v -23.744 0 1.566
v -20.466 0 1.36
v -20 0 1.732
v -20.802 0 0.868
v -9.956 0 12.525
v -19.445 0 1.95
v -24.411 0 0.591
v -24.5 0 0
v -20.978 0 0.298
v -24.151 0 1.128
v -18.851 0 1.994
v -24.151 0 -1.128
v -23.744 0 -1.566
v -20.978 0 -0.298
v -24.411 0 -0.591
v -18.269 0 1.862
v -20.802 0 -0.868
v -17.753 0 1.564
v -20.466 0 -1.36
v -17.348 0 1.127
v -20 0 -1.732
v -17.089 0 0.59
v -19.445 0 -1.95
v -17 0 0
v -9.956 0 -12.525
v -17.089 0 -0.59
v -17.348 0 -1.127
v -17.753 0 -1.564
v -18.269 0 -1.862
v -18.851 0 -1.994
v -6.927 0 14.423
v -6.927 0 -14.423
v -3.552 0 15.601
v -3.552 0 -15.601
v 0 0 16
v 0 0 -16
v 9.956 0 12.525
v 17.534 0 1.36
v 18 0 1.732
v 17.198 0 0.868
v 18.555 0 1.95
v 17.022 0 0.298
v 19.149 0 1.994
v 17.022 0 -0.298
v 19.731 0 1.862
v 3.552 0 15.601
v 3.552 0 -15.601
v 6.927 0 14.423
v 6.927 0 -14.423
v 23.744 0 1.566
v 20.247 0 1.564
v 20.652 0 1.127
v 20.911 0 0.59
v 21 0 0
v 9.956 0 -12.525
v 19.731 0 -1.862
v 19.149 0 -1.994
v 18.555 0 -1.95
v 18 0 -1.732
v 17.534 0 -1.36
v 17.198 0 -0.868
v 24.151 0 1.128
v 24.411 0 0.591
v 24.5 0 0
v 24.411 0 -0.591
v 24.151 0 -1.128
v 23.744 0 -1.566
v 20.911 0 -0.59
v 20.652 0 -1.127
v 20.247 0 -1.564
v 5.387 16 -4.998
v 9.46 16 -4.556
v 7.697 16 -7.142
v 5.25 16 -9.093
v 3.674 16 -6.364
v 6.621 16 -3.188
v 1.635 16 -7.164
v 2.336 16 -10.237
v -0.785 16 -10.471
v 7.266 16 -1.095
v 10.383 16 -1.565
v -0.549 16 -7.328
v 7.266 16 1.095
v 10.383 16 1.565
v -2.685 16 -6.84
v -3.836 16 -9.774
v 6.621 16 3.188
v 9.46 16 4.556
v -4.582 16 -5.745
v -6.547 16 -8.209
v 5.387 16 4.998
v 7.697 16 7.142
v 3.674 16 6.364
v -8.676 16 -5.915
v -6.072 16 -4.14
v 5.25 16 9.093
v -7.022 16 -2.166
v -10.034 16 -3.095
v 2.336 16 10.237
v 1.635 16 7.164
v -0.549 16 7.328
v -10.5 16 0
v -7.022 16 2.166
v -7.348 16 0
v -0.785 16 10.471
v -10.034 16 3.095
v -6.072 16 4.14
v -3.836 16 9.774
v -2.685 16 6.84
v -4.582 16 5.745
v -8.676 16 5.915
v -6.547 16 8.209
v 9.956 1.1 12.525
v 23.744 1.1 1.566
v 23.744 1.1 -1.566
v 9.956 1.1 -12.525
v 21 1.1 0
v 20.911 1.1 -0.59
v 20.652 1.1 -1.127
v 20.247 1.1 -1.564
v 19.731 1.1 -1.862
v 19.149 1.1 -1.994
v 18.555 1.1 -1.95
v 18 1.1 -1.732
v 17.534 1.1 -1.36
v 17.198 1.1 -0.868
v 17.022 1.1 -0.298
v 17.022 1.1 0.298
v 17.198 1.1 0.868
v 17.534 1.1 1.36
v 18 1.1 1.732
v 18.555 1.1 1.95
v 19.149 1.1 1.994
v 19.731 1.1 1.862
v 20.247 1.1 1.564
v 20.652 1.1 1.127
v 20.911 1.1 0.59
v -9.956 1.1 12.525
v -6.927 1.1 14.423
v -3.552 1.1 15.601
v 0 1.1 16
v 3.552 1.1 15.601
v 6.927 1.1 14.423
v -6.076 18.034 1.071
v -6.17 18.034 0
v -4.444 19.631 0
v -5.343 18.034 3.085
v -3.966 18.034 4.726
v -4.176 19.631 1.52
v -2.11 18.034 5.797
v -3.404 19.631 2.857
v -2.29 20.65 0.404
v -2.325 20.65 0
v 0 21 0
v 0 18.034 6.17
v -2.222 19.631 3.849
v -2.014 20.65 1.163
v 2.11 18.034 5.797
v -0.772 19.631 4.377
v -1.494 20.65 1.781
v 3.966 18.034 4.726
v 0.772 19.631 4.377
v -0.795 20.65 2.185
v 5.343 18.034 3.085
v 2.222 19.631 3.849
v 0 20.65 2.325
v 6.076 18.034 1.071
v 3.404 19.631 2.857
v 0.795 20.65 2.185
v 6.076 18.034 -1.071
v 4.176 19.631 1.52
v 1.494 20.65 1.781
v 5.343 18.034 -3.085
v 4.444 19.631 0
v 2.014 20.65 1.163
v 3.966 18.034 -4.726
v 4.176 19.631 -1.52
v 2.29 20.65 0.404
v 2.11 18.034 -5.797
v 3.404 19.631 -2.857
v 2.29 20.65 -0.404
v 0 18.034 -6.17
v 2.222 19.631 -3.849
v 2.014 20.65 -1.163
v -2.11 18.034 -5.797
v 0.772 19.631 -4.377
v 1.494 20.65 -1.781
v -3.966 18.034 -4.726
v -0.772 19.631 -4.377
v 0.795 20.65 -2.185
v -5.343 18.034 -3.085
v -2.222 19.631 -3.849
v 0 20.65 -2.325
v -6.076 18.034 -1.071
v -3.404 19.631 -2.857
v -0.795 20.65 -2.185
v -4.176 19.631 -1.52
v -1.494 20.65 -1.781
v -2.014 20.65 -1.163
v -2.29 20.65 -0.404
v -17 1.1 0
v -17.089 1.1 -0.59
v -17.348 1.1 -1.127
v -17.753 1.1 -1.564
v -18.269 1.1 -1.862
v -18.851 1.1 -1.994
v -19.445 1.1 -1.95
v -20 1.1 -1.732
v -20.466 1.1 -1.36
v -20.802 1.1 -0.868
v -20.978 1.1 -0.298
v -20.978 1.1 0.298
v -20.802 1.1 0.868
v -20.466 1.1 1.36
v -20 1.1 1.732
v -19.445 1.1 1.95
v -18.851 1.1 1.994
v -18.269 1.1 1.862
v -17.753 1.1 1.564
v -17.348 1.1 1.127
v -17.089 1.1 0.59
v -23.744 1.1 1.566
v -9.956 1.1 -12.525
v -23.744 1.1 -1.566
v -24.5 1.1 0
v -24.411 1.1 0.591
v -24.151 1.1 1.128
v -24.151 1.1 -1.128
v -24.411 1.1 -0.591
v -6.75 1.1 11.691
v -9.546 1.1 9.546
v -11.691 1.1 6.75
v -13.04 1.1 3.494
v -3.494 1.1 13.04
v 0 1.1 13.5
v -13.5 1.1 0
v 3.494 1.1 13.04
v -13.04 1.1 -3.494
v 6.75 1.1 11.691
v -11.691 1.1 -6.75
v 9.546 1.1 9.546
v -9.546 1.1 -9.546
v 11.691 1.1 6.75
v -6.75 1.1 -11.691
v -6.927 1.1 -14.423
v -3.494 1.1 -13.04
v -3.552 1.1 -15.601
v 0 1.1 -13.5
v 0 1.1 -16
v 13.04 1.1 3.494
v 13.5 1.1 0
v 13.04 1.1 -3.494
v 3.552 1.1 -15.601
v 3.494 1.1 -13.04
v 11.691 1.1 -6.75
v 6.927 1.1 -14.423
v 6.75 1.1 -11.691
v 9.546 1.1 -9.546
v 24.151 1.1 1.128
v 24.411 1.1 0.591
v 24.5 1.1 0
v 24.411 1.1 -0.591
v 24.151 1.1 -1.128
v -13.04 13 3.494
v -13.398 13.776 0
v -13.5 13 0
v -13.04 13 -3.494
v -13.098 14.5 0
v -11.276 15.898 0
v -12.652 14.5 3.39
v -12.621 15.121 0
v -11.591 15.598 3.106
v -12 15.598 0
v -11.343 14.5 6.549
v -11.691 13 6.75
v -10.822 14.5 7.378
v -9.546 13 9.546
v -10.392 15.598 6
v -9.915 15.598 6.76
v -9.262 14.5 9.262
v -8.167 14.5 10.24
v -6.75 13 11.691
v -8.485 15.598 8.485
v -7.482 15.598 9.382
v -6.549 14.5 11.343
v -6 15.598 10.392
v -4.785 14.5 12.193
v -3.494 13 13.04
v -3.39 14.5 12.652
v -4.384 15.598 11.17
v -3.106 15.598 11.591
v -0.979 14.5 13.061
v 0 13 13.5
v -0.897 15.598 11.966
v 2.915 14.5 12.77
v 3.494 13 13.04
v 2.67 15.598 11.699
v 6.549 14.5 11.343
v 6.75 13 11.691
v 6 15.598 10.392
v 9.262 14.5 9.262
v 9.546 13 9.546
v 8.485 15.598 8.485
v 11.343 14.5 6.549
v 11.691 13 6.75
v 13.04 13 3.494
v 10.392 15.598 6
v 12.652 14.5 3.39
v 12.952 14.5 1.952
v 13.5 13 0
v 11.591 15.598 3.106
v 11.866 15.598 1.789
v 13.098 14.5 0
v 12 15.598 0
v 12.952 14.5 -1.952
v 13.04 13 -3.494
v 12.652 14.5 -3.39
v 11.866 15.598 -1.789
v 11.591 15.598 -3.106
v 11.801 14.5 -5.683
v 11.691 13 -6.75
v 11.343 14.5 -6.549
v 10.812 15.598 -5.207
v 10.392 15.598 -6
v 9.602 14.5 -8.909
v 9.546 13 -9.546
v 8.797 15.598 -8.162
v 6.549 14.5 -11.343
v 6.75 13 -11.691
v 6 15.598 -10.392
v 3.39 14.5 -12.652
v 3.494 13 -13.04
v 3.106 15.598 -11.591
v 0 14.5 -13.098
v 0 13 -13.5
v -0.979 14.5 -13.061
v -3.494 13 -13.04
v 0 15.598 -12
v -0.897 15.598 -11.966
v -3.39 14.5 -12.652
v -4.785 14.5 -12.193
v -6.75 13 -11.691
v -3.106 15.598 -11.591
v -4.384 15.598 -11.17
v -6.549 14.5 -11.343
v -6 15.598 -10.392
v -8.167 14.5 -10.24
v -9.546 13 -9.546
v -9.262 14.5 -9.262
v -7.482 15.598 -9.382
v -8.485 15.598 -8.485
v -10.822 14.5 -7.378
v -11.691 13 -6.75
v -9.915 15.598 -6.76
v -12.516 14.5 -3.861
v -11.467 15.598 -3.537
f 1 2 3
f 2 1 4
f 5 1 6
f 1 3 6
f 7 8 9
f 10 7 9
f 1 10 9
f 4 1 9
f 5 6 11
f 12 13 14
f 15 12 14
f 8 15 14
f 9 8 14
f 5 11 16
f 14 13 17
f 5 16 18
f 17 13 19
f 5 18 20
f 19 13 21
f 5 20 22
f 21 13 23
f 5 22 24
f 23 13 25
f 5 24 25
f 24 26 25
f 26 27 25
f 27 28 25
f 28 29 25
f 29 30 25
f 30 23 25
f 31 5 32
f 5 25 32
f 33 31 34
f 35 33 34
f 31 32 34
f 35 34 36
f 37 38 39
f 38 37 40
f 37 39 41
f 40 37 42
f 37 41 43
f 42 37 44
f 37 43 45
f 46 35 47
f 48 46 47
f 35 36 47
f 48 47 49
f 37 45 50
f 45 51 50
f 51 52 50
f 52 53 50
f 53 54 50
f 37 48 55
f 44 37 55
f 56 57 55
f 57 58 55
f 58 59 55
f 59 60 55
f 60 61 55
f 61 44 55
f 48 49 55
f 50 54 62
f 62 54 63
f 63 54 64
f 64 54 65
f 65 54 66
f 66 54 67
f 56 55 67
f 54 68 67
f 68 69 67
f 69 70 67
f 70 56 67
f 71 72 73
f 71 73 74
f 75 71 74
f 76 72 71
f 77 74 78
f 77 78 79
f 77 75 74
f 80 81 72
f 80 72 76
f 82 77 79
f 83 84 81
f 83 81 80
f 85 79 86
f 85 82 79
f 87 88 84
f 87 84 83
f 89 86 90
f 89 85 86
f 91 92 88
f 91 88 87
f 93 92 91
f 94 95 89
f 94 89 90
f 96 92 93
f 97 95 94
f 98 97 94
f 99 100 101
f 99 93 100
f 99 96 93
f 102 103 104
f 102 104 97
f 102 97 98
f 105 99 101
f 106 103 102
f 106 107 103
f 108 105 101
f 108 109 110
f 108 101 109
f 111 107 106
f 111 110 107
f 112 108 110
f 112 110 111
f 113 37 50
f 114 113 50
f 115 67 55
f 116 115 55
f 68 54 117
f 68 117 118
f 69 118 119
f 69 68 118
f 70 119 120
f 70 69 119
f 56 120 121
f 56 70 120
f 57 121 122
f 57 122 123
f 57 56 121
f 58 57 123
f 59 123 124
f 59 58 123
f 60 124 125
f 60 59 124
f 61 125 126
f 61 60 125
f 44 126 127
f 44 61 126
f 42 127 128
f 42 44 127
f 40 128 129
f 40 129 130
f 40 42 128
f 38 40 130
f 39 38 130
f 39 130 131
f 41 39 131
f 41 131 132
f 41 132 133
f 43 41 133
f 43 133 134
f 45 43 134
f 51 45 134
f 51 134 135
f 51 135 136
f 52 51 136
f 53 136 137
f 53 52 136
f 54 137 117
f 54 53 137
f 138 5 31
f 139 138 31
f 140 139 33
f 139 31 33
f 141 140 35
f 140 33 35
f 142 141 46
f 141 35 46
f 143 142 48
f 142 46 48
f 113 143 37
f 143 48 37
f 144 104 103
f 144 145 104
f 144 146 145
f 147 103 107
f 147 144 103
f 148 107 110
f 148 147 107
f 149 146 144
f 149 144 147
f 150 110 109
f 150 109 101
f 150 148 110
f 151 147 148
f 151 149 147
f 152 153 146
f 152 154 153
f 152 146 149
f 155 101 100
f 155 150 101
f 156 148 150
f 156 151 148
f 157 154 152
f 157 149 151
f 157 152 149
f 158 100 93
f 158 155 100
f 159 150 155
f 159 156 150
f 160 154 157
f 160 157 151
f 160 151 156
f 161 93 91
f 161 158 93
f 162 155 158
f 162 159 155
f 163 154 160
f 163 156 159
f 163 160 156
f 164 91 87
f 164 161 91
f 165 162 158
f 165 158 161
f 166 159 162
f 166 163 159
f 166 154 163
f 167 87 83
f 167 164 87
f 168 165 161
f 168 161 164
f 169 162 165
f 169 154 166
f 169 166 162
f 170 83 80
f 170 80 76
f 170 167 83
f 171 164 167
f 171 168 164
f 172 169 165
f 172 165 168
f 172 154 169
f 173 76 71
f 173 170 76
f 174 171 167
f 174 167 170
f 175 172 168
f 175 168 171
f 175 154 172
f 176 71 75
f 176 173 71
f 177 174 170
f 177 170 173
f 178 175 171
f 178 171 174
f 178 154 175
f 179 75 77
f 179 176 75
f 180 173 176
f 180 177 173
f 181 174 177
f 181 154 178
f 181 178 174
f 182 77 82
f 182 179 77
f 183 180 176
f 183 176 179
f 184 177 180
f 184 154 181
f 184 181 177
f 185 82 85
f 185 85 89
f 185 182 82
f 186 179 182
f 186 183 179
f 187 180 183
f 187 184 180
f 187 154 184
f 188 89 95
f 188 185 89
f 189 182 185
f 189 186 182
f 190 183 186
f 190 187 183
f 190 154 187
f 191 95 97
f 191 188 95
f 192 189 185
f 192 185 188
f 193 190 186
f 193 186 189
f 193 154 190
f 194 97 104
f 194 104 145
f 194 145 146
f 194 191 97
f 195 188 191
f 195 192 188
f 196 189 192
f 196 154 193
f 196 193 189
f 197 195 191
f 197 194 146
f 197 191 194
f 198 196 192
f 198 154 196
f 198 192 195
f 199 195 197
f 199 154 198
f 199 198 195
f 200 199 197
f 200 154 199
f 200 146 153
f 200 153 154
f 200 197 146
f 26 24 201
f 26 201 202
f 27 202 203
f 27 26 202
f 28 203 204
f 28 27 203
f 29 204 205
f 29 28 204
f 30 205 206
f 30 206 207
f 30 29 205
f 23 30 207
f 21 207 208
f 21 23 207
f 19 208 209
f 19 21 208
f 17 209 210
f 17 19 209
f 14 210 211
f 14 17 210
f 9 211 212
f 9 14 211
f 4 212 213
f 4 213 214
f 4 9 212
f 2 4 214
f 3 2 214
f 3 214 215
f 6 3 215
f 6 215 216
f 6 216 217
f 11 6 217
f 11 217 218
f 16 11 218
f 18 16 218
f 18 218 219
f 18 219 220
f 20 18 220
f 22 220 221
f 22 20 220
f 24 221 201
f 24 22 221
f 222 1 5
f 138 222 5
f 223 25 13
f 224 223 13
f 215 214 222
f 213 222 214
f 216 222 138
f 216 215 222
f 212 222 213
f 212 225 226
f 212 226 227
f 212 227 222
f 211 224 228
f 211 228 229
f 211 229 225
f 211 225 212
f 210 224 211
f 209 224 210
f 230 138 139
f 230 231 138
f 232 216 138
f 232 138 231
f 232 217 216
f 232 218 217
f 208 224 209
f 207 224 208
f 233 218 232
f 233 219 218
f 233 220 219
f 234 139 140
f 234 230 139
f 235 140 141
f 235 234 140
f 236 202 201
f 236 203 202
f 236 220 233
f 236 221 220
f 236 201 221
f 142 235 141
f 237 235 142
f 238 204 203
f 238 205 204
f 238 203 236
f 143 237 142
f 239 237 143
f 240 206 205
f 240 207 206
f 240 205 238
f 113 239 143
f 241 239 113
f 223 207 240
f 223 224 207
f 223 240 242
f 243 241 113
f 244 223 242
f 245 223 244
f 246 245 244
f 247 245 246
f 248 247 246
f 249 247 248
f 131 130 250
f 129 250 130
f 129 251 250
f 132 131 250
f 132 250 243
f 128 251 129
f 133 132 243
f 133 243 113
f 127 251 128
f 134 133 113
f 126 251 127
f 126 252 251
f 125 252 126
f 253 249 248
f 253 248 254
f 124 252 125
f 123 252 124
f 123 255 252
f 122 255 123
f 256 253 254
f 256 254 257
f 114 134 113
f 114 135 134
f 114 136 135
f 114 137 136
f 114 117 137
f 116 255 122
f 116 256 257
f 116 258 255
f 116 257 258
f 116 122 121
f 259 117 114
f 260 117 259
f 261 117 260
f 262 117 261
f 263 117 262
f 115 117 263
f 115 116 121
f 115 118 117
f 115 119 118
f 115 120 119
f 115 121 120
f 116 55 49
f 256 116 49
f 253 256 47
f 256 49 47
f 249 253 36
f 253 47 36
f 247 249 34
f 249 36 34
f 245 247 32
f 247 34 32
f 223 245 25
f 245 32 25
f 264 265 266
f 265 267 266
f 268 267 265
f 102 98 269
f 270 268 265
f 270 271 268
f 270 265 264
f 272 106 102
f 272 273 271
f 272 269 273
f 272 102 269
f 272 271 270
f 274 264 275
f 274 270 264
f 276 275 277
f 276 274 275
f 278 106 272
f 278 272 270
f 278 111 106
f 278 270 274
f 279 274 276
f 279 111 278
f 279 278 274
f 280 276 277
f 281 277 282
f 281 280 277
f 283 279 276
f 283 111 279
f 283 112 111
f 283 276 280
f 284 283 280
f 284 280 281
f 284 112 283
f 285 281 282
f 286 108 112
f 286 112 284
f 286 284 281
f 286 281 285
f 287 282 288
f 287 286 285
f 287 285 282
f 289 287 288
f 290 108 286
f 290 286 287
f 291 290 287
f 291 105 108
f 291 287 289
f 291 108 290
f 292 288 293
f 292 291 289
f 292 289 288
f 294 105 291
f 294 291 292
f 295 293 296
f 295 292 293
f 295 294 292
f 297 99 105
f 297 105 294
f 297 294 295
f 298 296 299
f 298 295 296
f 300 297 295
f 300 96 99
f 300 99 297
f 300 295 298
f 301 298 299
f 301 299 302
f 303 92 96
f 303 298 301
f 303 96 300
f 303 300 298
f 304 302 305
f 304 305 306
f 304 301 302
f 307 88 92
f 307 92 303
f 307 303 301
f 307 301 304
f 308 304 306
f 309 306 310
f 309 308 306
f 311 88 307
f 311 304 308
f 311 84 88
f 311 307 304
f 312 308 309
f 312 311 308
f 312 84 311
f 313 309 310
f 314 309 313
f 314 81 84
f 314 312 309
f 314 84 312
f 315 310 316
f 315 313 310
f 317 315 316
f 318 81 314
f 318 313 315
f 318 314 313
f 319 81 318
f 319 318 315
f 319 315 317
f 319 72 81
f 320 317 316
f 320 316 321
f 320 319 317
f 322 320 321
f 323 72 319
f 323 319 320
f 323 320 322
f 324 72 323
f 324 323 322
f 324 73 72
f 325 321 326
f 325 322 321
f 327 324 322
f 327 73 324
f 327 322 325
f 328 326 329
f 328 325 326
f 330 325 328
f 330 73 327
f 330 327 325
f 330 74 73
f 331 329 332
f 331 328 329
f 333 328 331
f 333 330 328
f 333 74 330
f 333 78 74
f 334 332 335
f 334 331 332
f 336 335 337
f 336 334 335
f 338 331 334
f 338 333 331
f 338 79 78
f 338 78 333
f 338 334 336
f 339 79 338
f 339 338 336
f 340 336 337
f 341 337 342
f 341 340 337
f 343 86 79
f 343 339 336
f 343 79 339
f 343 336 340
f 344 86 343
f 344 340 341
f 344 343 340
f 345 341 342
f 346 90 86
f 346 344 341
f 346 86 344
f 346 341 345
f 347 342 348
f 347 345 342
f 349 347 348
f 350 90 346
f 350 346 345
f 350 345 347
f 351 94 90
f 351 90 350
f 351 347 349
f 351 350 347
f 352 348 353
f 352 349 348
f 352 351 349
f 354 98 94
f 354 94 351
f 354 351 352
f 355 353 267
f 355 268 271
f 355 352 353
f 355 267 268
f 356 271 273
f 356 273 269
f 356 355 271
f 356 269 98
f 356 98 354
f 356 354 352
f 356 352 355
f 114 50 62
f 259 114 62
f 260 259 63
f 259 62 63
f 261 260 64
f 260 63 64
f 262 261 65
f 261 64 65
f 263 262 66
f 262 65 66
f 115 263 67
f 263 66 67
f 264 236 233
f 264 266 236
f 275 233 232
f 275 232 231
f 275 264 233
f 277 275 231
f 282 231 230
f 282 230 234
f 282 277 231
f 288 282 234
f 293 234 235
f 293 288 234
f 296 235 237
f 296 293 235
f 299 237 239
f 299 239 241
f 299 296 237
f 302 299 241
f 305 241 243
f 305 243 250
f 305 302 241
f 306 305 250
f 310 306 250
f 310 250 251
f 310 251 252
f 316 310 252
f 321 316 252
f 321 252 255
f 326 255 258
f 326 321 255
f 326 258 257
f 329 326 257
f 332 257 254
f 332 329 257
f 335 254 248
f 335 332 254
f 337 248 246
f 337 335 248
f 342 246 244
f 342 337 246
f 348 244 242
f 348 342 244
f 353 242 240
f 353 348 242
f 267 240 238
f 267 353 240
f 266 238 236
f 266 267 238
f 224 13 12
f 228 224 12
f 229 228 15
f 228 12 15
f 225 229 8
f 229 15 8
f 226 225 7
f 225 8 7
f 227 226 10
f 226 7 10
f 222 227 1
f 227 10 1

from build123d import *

# Parameters (mm, degrees)
SKETCH_1_R      = 2
EXTRUDE_1_DEPTH = 1.1


with BuildPart() as part:
    # 草图1 → 凸台-拉伸1 (new body)
    with BuildSketch(Plane(origin=(0, 0, 0), x_dir=(1, 0, 0), z_dir=(0, 1, 0))):
        with BuildLine():
            Line((-9.955555556, 12.525450634), (-23.744444444, 1.565681329))
            ThreePointArc((-23.744444444, 1.565681329), (-24.5, 0), (-23.744444444, -1.565681329))
            Line((-23.744444444, -1.565681329), (-9.955555556, -12.525450634))
            ThreePointArc((-9.955555556, -12.525450634), (0, -16), (9.955555556, -12.525450634))
            Line((9.955555556, -12.525450634), (23.744444444, -1.565681329))
            ThreePointArc((23.744444444, -1.565681329), (24.5, 0), (23.744444444, 1.565681329))
            Line((23.744444444, 1.565681329), (9.955555556, 12.525450634))
            ThreePointArc((9.955555556, 12.525450634), (0, 16), (-9.955555556, 12.525450634))
        make_face()
        with Locations((-19, 0)):
            Circle(SKETCH_1_R, mode=Mode.SUBTRACT)
        with Locations((19, 0)):
            Circle(SKETCH_1_R, mode=Mode.SUBTRACT)
    extrude(amount=EXTRUDE_1_DEPTH)

    # 草图2 → 旋转1 (revolve)
    with BuildSketch(Plane.XY):
        with BuildLine():
            Line((0, 1.1), (-13.5, 1.1))
            Line((-13.5, 1.1), (-13.5, 13))
            ThreePointArc((-13.5, 13), (-12.621320344, 15.121320344), (-10.5, 16))
            Line((-10.5, 16), (-7.348469228, 16))
            ThreePointArc((-7.348469228, 16), (-4.444097209, 19.631462317), (0, 21))
            Line((0, 21), (0, 1.1))
        make_face()
    revolve(axis=Axis((0, 1.1, 0), (0, 1, 0)))


solid = part.part
